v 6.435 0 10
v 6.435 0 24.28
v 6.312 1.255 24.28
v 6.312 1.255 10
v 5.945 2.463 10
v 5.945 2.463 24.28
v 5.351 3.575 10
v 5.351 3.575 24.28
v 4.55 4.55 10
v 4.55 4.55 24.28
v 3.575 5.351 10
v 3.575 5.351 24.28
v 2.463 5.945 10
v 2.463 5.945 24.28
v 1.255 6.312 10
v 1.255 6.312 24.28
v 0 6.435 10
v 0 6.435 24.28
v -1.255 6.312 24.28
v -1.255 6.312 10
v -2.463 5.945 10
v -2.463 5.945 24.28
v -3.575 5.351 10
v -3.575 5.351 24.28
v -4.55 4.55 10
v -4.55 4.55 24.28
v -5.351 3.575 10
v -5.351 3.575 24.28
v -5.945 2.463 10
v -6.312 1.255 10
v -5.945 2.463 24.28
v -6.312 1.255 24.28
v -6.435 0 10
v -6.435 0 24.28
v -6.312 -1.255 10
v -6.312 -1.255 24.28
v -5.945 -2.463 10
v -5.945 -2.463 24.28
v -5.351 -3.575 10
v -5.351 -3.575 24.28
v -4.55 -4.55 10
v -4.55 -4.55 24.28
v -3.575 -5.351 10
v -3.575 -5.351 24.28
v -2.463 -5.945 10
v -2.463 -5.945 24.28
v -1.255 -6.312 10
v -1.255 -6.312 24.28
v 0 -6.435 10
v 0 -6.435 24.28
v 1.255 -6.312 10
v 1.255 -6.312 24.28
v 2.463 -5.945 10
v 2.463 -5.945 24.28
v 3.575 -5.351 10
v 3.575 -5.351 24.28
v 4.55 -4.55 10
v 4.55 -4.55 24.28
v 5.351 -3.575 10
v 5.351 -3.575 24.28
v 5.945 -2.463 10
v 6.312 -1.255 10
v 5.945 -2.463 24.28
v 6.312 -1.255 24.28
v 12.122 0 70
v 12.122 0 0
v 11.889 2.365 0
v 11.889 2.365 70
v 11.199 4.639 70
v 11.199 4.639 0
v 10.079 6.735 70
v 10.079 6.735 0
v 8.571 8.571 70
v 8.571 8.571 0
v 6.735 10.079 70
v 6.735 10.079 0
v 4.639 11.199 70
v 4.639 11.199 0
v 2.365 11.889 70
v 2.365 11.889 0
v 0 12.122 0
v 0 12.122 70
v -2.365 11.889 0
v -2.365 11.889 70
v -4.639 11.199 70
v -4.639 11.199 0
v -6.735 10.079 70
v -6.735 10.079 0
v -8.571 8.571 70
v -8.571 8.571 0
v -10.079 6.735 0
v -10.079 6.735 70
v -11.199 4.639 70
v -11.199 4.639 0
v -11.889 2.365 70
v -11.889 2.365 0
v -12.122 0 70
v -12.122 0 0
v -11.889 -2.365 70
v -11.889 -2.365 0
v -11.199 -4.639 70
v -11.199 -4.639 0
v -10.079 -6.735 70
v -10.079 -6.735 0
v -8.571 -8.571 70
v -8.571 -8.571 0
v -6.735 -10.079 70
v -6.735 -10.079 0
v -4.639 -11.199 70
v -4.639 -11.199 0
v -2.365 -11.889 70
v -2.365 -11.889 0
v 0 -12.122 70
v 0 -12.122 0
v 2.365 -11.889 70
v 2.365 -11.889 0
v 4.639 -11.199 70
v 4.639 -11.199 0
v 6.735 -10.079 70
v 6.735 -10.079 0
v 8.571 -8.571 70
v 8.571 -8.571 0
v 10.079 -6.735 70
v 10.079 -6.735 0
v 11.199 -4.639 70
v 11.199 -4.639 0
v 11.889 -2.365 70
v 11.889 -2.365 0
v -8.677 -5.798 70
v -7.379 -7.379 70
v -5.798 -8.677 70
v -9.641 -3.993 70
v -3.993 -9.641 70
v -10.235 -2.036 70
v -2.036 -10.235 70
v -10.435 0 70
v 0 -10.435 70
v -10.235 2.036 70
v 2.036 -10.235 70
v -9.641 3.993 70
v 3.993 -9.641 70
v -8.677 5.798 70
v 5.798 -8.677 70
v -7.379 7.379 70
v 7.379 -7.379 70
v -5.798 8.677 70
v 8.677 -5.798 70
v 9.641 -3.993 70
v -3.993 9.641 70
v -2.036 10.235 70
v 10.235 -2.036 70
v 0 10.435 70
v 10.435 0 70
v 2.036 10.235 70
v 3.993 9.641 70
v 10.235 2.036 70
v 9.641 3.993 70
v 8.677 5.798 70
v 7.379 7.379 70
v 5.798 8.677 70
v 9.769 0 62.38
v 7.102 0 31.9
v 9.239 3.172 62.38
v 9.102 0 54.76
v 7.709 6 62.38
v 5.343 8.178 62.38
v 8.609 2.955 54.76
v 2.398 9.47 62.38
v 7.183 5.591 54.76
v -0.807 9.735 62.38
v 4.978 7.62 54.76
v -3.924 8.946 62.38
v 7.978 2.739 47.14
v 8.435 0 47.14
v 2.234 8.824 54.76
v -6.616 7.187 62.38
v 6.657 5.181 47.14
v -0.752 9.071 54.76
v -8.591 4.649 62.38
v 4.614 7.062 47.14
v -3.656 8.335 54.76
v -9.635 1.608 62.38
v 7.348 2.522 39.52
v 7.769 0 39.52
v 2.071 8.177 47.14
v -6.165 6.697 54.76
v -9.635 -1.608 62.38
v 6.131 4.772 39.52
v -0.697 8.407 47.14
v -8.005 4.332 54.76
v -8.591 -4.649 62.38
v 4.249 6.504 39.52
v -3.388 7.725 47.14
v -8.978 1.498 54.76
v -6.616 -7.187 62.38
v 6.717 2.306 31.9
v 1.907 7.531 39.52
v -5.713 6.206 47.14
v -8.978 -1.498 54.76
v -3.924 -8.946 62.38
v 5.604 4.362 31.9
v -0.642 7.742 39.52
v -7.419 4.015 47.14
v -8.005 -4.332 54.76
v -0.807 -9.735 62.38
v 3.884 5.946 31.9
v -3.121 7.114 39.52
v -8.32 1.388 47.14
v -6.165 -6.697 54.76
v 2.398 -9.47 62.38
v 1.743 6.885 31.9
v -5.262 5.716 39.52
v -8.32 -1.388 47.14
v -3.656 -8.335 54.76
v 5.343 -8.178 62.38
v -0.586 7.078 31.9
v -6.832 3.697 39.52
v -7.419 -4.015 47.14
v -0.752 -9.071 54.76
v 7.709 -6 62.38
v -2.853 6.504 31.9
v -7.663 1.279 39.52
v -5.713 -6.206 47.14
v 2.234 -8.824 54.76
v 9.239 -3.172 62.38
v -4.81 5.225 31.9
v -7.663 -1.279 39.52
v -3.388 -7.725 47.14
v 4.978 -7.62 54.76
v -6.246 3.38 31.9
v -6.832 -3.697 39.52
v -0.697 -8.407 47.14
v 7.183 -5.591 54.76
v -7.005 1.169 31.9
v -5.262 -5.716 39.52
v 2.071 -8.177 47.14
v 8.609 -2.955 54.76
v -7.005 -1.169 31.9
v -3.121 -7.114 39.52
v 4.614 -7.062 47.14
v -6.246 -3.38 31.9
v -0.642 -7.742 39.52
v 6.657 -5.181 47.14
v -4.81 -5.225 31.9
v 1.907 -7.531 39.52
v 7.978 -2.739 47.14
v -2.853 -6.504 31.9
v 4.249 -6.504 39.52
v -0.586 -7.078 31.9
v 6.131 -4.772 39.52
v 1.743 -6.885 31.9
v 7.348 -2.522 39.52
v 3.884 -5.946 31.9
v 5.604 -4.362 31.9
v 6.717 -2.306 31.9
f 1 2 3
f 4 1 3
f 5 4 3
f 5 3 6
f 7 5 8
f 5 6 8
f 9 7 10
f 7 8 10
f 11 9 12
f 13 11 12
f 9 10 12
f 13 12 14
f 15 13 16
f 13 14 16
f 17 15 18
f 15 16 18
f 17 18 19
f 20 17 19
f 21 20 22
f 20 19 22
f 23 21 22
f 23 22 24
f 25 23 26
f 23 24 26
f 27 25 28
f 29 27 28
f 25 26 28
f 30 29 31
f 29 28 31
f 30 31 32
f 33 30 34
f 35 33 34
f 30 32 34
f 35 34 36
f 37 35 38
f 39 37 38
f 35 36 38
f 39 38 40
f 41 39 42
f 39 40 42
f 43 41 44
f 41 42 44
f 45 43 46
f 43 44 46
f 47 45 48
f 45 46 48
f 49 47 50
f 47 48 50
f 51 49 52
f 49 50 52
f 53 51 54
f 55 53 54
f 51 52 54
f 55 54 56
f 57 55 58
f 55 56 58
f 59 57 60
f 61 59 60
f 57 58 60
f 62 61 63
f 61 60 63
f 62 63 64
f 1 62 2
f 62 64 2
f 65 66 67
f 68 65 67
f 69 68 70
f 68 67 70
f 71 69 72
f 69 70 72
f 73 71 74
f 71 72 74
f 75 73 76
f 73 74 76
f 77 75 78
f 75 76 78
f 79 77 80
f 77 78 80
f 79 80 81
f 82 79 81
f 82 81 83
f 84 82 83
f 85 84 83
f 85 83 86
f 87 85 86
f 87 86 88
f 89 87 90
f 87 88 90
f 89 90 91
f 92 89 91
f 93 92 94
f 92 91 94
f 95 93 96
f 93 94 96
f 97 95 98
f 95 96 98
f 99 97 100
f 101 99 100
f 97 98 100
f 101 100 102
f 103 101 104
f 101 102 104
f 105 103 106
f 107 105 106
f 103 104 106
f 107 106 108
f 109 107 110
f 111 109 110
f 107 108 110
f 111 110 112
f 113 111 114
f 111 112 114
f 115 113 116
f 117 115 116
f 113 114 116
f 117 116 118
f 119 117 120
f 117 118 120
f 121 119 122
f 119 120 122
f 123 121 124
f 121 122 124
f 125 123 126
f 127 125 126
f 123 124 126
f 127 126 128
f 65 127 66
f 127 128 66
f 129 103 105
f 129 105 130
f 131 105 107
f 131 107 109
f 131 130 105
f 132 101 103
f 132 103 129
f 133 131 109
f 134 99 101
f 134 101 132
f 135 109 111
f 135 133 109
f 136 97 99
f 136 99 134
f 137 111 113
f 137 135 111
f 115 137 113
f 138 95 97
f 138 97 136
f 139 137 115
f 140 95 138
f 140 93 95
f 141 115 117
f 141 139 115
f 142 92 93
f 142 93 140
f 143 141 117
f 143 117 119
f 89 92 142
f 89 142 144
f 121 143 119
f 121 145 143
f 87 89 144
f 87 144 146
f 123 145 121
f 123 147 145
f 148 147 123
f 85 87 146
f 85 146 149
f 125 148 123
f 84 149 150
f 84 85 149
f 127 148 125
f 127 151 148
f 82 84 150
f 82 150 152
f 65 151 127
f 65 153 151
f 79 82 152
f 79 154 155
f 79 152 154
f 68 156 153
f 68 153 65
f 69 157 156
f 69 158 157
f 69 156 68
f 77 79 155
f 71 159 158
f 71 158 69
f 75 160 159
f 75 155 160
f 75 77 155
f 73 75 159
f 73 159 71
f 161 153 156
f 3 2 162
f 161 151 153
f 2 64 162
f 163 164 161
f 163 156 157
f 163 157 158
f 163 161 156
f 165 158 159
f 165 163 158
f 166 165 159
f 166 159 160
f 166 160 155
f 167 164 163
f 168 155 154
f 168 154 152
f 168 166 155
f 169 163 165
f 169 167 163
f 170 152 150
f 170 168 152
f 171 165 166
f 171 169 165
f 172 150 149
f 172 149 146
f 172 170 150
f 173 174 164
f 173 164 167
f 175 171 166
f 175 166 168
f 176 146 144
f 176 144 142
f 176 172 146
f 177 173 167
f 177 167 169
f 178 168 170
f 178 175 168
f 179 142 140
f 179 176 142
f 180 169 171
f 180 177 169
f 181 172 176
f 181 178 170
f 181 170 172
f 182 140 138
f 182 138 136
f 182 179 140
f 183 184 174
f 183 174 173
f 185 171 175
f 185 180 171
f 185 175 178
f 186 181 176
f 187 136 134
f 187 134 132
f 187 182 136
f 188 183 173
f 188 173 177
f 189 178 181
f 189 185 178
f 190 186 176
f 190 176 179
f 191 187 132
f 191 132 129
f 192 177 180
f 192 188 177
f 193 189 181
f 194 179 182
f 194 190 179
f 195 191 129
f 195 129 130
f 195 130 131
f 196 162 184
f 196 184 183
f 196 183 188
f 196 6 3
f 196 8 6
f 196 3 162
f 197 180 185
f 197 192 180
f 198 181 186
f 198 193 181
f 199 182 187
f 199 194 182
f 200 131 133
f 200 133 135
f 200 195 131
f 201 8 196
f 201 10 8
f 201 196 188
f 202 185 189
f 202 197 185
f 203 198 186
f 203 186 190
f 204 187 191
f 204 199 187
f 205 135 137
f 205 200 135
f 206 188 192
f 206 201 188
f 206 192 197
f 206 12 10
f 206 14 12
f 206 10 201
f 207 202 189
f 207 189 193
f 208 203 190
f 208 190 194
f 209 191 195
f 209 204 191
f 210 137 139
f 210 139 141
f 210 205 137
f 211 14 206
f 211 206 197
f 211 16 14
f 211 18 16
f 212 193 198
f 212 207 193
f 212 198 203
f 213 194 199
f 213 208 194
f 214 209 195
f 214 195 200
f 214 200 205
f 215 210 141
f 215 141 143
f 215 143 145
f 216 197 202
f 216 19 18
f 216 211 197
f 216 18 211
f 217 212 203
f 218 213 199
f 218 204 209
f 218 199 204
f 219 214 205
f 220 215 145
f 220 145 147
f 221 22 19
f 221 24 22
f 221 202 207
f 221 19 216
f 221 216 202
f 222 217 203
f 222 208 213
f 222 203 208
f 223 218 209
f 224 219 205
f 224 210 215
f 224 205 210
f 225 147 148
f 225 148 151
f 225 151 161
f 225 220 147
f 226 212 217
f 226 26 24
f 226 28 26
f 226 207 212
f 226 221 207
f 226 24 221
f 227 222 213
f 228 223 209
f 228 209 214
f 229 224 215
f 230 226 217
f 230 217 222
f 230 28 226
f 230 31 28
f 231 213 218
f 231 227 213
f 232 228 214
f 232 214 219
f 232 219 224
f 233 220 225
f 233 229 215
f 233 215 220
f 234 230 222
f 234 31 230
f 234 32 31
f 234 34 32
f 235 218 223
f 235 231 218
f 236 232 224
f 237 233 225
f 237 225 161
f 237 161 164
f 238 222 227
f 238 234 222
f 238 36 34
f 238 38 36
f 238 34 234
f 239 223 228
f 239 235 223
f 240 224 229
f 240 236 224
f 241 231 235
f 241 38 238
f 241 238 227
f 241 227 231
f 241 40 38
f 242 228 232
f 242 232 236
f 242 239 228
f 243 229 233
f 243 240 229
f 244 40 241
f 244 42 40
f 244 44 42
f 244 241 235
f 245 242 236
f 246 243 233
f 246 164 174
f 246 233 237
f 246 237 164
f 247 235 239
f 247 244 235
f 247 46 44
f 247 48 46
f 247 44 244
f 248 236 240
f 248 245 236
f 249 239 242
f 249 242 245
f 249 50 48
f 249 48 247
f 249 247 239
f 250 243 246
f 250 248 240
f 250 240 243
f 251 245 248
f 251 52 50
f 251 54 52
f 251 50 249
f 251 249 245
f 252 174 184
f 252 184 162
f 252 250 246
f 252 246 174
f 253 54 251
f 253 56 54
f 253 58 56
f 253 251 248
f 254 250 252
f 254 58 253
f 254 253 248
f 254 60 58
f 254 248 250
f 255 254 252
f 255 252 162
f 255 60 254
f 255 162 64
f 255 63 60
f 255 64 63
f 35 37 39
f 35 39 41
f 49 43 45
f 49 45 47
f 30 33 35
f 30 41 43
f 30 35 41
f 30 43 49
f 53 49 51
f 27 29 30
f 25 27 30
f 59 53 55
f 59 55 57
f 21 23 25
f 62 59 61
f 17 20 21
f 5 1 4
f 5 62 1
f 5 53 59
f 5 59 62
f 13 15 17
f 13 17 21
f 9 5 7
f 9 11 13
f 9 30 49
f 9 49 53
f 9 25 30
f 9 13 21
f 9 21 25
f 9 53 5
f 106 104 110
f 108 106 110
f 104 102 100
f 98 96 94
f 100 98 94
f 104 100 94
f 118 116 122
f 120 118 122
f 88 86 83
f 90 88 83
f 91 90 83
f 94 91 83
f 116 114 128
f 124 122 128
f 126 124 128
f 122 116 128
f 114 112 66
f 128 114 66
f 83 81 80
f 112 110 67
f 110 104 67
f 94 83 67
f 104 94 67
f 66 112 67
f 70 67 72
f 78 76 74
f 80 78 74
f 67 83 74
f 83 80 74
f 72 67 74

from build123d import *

# Parameters (mm, degrees)
SKETCH1_R           = 12.121929558
BOSS_EXTRUDE1_DEPTH = 70
SKETCH2_R           = 6.435362547
CUT_EXTRUDE1_DEPTH  = 60
CHAMFER1_SIZE       = 4
CHAMFER1_SIZE2      = 45.720209211


with BuildPart() as part:
    # Sketch1 → Boss-Extrude1 (new body)
    with BuildSketch(Plane.XY):
        Circle(SKETCH1_R)
    extrude(amount=BOSS_EXTRUDE1_DEPTH)

    # Sketch2 → Cut-Extrude1 (cut)
    with BuildSketch(Plane.XY.offset(70)):
        Circle(SKETCH2_R)
    extrude(amount=-CUT_EXTRUDE1_DEPTH, mode=Mode.SUBTRACT)

    # Chamfer1
    chamfer1_edges = [part.edges().sort_by_distance(p)[0] for p in [
        (-6.435362547, 0, 70),
    ]]
    chamfer1_side = [part.faces().sort_by_distance(p)[0] for p in [
        (-11.779069614, 0, 70),
    ]]
    chamfer(chamfer1_edges, length=CHAMFER1_SIZE, length2=CHAMFER1_SIZE2, reference=chamfer1_side[0])


solid = part.part
